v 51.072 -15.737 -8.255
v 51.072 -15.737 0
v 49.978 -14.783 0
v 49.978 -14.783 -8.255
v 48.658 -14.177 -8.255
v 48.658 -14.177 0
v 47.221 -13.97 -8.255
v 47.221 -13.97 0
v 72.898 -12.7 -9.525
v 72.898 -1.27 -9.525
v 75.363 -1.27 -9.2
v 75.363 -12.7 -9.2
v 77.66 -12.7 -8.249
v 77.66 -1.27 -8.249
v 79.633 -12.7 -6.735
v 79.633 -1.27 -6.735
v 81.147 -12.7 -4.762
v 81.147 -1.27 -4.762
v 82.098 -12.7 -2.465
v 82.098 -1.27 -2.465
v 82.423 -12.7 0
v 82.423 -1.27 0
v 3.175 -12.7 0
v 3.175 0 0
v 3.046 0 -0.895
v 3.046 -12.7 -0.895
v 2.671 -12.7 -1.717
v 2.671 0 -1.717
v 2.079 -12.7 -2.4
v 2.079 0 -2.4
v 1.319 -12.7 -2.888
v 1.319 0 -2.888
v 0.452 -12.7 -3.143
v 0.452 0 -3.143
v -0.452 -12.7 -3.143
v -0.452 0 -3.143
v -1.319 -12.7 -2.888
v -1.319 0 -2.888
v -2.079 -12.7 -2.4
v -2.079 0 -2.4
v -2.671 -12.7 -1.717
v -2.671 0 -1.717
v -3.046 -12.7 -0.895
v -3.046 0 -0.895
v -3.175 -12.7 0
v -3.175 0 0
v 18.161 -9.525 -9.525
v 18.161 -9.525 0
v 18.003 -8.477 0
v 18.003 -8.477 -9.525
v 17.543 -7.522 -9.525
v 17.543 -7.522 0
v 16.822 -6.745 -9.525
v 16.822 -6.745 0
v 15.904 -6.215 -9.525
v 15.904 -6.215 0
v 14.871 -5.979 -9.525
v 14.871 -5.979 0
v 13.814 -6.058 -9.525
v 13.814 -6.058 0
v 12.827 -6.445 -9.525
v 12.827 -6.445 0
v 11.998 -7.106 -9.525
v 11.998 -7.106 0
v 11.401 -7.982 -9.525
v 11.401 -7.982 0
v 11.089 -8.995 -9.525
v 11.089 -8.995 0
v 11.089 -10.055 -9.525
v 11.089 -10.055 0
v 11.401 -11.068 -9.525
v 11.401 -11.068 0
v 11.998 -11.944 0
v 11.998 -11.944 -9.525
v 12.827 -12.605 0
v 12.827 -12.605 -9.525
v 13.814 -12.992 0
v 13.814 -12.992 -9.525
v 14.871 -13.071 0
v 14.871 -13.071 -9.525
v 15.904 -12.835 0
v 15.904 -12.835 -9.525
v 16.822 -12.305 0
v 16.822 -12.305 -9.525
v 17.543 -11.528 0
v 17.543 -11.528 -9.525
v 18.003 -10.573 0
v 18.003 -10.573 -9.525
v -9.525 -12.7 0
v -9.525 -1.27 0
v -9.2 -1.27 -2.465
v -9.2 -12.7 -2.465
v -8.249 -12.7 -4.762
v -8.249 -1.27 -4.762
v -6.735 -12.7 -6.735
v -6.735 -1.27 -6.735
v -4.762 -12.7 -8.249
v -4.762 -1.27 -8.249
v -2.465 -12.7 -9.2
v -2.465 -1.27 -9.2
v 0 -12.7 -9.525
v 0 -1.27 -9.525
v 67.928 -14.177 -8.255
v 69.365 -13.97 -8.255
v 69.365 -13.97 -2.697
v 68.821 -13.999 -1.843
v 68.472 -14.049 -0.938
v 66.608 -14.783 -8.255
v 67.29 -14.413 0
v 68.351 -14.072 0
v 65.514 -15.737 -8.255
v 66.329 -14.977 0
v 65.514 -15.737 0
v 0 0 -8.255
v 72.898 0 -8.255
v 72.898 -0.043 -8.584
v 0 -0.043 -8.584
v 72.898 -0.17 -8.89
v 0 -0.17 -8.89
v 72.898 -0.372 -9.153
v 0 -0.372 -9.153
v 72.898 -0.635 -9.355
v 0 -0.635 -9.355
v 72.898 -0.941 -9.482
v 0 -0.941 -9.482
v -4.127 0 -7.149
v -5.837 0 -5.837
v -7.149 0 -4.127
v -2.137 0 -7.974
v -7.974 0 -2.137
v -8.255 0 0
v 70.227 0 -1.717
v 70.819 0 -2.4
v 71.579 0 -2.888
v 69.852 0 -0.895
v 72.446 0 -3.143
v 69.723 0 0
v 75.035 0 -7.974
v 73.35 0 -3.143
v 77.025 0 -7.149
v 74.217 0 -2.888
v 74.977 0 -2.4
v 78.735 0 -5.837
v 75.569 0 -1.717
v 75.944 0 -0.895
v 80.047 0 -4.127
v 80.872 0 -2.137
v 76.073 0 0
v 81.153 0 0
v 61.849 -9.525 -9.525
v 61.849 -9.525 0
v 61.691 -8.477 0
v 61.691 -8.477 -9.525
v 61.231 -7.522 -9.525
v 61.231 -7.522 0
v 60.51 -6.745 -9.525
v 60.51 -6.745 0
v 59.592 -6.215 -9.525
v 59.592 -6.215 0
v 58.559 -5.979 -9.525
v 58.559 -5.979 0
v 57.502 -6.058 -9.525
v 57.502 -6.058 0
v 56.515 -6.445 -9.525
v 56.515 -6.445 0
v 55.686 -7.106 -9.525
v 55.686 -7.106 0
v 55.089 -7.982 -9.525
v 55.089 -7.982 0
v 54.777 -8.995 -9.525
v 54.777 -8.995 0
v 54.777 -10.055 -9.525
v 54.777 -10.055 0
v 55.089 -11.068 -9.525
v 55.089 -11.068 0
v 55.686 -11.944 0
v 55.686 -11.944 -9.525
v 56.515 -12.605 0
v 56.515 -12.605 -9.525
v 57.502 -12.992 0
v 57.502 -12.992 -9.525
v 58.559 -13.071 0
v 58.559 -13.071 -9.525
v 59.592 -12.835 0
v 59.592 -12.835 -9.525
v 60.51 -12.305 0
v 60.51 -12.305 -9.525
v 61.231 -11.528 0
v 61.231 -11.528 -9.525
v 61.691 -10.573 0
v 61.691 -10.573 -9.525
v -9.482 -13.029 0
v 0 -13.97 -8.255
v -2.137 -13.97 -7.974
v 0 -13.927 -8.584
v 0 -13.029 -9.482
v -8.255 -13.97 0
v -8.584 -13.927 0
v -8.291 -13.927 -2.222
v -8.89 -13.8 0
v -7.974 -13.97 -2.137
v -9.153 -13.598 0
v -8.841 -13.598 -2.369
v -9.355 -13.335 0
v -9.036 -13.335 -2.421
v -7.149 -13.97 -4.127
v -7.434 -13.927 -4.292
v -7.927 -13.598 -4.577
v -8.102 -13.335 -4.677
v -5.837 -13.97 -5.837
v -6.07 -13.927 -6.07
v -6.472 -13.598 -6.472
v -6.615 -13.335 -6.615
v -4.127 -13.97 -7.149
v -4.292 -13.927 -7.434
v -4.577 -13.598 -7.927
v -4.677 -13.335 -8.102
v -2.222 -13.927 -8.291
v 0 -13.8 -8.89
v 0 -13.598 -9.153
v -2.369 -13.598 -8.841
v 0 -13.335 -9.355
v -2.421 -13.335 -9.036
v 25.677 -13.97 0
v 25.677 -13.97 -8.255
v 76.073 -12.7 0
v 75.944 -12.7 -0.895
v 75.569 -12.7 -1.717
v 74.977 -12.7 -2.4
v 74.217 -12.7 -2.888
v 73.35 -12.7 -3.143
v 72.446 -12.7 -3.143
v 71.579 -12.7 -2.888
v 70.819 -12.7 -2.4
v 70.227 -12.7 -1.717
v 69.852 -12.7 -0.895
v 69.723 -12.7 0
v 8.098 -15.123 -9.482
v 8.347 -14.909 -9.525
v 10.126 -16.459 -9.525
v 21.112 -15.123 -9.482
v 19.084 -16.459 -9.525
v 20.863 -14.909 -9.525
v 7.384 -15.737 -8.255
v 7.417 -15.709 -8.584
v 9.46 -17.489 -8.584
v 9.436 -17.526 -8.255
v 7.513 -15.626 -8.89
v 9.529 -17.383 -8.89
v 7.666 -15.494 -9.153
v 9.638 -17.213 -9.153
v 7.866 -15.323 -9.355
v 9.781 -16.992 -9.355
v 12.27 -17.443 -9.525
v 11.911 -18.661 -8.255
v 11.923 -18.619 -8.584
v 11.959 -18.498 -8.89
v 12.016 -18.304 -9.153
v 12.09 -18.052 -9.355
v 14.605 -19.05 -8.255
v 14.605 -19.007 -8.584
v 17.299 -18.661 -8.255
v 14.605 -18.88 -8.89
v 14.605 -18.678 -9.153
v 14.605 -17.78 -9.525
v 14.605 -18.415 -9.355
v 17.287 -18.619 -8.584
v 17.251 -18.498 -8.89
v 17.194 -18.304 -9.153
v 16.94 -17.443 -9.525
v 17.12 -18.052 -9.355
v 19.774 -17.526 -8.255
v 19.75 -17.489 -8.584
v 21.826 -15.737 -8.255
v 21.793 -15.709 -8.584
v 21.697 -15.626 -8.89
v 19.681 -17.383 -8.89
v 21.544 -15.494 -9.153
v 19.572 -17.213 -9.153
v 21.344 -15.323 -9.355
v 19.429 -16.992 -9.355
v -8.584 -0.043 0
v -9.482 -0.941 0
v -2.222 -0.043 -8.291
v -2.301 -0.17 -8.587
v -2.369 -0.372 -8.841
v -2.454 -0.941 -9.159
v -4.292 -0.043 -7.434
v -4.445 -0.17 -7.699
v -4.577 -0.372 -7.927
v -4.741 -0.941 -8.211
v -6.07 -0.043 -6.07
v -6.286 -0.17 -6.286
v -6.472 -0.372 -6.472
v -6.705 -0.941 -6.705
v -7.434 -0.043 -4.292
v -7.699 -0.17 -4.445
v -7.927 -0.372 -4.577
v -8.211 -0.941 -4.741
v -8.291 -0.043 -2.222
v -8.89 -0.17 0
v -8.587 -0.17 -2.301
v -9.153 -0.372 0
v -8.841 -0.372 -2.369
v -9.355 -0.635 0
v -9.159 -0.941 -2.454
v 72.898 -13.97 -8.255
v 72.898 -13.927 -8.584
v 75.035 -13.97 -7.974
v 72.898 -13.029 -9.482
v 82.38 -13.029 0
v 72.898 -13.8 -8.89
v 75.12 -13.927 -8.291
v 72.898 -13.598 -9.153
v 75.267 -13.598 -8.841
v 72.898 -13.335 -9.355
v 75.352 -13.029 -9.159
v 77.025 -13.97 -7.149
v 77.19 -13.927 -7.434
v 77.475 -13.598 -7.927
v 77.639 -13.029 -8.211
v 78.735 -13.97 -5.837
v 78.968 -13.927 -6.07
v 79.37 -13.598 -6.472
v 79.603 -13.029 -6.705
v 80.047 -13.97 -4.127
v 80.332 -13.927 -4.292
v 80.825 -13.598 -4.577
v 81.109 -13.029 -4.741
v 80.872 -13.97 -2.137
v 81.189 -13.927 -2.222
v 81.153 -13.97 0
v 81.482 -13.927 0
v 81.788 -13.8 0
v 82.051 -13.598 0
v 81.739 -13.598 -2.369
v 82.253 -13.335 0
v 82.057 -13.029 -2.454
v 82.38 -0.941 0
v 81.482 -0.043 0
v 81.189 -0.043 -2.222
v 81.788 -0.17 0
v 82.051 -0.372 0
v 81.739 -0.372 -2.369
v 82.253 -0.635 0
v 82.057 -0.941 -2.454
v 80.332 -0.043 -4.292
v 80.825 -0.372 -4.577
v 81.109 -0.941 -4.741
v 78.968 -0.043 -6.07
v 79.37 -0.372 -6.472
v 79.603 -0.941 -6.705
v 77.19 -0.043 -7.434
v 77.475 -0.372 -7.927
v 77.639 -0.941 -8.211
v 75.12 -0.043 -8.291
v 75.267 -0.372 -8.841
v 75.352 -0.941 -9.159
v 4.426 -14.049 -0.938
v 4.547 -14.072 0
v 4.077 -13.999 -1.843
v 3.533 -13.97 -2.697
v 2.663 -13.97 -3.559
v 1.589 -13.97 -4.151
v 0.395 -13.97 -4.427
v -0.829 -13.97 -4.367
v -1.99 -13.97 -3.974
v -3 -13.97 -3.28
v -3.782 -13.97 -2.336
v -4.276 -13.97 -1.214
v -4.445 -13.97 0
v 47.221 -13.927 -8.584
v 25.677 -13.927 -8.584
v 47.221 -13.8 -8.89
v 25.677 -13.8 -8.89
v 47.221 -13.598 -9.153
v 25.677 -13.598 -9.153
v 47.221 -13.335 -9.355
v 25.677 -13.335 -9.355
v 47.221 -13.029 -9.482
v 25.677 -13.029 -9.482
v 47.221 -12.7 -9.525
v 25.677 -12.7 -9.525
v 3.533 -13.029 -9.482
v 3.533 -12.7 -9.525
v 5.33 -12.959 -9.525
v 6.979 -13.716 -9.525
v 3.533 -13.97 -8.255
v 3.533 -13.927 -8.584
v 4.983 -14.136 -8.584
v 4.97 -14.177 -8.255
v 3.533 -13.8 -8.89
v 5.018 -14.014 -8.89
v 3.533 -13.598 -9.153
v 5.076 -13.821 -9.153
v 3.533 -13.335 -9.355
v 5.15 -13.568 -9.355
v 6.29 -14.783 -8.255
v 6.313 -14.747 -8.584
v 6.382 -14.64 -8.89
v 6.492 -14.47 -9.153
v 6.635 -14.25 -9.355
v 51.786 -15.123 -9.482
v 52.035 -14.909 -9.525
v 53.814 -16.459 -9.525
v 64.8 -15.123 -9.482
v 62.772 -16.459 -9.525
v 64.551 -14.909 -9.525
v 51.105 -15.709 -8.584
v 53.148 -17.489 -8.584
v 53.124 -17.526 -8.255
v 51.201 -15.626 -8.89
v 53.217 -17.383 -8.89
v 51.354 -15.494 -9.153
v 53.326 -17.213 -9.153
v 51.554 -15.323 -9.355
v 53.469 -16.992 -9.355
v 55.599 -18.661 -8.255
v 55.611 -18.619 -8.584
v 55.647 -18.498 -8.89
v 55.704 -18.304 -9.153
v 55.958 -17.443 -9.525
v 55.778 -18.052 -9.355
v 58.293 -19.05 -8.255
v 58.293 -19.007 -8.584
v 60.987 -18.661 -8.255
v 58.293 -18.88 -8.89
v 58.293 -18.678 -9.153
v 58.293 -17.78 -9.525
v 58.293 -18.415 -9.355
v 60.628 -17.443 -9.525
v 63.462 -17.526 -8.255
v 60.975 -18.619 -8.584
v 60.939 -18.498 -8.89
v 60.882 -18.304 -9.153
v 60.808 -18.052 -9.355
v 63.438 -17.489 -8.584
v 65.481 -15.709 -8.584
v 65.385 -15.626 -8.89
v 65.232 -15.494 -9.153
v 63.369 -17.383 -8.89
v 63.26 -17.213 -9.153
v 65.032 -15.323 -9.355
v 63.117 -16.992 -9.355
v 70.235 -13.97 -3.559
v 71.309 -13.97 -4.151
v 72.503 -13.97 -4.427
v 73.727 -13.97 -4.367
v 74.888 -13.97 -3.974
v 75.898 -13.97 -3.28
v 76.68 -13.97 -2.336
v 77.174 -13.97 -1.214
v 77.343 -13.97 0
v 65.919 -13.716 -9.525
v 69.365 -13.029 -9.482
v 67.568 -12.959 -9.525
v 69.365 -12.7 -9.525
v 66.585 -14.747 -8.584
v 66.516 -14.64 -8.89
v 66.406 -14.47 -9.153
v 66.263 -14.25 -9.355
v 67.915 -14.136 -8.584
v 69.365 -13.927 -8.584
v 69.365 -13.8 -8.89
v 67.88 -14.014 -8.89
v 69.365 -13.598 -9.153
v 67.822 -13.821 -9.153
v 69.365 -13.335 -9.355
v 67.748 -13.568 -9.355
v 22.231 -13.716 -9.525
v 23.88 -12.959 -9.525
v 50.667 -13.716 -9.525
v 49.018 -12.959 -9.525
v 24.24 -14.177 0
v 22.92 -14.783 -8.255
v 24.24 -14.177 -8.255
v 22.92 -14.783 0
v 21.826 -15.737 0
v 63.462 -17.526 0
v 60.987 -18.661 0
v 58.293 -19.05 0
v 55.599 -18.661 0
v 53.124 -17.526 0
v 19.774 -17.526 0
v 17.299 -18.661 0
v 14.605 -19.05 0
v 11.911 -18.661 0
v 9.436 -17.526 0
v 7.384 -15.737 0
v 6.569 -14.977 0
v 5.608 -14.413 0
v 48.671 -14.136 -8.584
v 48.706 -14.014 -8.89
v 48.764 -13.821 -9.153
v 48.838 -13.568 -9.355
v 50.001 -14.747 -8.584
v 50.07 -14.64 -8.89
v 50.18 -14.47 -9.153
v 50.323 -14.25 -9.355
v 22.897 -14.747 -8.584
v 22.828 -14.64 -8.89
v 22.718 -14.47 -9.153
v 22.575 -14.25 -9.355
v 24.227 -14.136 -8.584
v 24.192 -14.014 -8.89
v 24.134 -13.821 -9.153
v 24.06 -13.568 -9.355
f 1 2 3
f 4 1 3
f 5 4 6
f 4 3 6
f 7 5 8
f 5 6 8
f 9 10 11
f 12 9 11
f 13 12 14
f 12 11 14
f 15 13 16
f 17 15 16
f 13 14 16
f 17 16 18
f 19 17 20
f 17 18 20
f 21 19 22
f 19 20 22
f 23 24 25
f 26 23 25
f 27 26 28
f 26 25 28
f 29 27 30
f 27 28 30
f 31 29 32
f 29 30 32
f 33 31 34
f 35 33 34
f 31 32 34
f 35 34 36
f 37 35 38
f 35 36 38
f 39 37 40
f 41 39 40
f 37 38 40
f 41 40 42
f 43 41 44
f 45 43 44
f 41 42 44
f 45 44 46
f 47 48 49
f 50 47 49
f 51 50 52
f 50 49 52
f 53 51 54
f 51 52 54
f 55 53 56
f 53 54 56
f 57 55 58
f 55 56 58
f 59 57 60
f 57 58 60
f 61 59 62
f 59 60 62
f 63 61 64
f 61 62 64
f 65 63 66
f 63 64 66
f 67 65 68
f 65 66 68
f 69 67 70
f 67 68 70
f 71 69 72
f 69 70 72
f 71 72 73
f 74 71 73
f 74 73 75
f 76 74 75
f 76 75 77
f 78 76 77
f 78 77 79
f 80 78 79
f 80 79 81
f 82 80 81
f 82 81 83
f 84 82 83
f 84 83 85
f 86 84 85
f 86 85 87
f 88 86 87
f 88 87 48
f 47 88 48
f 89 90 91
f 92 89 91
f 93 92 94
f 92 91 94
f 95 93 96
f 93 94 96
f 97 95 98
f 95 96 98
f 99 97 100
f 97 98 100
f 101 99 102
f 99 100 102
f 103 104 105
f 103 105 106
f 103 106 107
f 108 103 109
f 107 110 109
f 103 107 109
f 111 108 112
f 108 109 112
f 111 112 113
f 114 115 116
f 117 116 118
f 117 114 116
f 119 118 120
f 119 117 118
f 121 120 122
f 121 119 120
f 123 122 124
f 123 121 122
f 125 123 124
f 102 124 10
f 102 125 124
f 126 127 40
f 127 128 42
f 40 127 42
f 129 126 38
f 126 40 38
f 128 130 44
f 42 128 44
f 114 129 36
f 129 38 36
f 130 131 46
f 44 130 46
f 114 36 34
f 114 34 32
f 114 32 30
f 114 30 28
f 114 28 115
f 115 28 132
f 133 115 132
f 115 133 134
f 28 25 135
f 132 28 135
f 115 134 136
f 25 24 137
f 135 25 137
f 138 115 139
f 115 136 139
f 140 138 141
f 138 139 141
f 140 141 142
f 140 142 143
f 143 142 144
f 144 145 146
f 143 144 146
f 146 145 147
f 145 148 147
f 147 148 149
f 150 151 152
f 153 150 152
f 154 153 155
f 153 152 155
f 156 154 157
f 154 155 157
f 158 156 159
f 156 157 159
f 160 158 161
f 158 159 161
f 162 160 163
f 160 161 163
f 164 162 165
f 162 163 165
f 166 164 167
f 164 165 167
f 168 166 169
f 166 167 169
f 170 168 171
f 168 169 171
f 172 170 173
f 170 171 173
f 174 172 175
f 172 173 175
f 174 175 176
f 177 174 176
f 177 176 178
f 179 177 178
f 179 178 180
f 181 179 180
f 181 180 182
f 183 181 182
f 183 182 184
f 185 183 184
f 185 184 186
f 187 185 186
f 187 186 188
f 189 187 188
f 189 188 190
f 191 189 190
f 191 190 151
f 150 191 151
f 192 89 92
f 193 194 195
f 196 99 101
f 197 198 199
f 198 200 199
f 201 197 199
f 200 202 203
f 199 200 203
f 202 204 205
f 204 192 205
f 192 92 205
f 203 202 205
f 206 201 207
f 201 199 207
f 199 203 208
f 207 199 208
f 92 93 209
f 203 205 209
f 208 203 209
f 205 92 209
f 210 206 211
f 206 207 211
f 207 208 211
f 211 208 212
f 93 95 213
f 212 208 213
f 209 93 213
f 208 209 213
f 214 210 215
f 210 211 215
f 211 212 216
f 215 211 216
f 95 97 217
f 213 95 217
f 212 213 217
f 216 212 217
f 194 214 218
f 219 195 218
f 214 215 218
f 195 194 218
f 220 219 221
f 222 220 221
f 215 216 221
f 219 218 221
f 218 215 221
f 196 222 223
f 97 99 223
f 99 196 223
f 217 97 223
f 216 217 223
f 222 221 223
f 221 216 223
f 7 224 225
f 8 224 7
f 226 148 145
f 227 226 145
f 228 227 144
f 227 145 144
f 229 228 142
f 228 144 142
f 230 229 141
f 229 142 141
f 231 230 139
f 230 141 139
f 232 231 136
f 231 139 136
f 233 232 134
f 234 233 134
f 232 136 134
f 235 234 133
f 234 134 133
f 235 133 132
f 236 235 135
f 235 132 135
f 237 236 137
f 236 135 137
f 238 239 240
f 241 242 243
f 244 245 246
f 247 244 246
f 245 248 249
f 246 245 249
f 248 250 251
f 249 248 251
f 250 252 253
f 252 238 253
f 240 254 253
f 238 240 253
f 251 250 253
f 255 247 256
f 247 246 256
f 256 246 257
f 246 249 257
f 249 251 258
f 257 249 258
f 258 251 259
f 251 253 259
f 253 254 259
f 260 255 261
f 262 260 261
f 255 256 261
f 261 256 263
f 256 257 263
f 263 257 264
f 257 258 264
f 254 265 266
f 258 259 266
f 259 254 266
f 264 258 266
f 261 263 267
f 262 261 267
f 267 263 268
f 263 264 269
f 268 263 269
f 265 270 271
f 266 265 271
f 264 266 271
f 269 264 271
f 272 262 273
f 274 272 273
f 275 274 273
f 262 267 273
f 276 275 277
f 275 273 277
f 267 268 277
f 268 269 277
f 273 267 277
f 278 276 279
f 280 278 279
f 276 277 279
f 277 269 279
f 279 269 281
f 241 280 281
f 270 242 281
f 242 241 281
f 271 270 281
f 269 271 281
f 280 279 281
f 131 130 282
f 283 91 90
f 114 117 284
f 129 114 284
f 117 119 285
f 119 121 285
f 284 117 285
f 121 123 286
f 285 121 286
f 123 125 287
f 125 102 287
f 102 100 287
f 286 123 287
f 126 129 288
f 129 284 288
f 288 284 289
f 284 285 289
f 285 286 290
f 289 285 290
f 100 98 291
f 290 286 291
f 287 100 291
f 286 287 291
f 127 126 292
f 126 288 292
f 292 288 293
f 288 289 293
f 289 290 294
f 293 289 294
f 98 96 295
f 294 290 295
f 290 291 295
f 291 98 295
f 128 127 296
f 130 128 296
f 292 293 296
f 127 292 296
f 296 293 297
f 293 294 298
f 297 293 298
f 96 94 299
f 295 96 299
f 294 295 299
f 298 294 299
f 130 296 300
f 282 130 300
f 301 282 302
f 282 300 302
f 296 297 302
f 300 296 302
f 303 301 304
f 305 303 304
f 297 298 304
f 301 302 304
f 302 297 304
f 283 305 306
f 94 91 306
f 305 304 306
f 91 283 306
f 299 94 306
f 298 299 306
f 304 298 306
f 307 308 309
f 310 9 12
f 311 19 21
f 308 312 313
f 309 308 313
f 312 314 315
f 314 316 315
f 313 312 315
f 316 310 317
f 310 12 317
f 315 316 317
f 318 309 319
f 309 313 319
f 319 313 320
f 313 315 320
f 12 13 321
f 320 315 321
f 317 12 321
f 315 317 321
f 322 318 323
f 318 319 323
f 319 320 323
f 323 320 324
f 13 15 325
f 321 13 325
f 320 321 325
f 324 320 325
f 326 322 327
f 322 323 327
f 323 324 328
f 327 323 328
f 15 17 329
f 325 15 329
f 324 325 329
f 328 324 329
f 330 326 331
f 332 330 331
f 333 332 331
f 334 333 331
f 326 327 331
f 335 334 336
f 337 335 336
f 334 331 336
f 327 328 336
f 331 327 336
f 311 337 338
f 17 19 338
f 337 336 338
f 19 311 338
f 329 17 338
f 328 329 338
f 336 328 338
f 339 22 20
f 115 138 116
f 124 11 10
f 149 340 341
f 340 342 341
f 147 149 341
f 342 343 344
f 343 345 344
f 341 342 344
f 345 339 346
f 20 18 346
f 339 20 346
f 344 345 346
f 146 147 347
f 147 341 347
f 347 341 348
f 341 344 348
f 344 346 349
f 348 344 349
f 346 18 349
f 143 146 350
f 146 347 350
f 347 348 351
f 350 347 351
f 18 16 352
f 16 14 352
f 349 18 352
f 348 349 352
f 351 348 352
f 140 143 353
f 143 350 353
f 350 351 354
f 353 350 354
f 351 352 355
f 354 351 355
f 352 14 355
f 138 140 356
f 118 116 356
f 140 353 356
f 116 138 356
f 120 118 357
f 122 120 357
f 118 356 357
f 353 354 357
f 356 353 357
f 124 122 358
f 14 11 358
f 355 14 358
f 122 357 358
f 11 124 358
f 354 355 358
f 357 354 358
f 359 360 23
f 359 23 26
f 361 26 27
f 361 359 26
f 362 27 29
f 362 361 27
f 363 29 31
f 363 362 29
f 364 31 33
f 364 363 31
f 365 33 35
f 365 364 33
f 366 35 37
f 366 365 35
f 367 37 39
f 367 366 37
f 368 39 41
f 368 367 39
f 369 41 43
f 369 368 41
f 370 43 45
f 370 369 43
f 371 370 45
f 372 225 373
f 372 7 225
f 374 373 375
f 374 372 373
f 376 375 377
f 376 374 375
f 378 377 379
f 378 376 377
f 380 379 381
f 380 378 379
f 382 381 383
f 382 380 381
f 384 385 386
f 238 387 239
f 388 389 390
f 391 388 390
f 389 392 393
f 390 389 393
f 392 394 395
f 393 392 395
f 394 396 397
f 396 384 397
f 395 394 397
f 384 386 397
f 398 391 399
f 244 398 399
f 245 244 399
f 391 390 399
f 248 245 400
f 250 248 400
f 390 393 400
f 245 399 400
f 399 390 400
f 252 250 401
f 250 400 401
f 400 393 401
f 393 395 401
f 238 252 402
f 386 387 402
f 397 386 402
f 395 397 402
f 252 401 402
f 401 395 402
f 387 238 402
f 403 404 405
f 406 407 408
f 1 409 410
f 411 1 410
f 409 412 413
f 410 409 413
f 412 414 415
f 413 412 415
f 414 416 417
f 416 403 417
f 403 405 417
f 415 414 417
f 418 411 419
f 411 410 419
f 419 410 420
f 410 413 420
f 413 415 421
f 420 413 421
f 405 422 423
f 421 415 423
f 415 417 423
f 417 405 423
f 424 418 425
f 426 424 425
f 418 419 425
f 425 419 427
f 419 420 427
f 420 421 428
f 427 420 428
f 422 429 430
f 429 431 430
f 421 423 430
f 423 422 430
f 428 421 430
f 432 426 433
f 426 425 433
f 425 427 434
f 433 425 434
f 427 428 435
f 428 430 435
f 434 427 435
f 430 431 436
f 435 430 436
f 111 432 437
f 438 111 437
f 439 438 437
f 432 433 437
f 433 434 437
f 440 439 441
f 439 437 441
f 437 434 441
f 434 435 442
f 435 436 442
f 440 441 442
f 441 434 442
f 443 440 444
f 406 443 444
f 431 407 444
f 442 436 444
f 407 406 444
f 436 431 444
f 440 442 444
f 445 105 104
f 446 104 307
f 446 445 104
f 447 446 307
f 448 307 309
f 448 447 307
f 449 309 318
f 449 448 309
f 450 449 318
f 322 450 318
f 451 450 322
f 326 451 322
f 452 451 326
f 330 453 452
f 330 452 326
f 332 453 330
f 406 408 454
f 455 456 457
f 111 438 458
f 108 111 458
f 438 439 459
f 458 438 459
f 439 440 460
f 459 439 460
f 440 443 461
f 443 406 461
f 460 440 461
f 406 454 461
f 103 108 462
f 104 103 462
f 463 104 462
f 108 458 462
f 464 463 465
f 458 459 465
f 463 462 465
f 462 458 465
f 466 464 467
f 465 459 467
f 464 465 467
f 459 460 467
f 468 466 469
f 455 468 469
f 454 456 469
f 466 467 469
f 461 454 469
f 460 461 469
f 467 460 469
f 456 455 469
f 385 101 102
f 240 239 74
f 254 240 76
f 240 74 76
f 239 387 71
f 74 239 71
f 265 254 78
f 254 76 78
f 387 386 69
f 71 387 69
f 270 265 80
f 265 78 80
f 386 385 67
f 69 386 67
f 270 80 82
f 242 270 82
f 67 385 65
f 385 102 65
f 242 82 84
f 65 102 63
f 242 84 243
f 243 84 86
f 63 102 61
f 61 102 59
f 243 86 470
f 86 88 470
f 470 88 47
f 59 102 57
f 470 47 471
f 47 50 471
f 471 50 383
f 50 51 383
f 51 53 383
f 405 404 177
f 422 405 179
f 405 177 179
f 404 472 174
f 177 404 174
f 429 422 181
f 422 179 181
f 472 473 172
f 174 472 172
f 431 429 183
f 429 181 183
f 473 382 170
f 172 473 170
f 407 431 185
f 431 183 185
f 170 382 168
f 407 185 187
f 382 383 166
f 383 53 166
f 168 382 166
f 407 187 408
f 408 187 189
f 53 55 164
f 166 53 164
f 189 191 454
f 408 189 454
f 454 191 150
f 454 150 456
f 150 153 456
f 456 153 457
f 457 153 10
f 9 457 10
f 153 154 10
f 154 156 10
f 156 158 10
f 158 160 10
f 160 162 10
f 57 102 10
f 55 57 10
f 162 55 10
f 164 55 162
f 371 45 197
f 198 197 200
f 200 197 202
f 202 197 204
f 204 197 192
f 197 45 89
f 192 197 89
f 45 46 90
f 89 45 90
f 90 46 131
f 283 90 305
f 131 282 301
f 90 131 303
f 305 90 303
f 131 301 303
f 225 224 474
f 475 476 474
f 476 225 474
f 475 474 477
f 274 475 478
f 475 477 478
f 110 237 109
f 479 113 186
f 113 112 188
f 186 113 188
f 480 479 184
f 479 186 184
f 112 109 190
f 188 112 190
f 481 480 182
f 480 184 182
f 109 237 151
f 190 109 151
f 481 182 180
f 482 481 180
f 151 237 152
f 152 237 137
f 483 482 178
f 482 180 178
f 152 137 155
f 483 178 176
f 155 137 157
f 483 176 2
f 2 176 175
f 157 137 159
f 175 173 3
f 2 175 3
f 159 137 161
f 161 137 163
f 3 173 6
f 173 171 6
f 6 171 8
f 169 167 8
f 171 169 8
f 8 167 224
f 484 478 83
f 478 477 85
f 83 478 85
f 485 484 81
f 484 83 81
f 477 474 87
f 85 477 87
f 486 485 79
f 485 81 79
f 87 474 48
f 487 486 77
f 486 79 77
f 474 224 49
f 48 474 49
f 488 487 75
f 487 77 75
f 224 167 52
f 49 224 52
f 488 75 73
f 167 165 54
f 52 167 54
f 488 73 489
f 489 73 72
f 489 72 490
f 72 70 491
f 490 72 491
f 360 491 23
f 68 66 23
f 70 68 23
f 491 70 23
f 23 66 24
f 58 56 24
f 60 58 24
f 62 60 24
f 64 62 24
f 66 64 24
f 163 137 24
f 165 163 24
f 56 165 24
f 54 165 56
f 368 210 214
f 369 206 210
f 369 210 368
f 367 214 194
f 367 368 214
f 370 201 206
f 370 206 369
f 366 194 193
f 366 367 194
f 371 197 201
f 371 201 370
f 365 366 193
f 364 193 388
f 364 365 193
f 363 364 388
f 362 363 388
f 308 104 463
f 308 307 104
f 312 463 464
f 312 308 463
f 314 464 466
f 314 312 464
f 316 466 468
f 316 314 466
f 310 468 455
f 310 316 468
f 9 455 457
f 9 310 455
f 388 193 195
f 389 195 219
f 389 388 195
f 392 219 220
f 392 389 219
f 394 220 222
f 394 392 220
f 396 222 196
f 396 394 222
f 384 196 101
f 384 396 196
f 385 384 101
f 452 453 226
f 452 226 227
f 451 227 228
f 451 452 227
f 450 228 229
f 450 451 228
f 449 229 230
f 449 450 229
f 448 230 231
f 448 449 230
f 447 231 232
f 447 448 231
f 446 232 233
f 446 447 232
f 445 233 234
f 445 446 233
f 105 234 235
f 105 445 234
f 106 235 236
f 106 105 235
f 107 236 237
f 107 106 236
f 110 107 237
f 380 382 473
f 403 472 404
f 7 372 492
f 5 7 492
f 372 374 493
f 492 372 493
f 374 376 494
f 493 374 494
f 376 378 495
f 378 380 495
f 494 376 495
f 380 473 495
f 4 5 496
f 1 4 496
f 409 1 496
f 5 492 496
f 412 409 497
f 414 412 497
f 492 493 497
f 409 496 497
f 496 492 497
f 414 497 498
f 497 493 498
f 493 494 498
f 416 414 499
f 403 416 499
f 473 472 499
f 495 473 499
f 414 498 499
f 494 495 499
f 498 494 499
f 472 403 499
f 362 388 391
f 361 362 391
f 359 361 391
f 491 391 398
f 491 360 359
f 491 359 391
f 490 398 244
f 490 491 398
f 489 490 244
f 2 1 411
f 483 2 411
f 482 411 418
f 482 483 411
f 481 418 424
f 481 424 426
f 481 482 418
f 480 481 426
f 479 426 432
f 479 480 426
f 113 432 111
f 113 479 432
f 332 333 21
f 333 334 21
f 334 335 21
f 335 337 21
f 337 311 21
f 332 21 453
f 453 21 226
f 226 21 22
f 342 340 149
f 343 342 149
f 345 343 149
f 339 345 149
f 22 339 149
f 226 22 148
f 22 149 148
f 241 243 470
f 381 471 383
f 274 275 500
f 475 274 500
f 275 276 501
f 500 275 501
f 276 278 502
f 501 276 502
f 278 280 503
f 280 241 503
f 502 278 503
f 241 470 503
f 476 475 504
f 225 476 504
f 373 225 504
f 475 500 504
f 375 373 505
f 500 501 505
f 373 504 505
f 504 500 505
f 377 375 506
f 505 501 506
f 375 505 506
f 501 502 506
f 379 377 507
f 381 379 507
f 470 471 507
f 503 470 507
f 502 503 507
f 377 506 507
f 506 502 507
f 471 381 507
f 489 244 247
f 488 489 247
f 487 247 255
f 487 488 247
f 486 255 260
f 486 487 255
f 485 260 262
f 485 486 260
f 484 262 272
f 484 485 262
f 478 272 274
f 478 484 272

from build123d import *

# Parameters (mm, degrees)
F1_DEPTH = 13.97
F2_R     = 9.525
F3_DEPTH = 9.525
F4_R     = 3.556
F5_DEPTH = 9.526
F6_SIZE  = 1.27
F7_R     = 5.08
F8_R     = 1.27


with BuildPart() as f1:
    # F0 (on Front) → F1 (new body)
    with BuildSketch(Plane.XZ):
        with BuildLine():
            ThreePointArc((3.175, 0), (0, -3.175), (-3.175, 0))
            Line((-3.175, 0), (-9.525, 0))
            ThreePointArc((-9.525, 0), (-6.7351920908, -6.7351920908), (0, -9.525))
            ThreePointArc((0, -9.525), (6.7351920908, -6.7351920908), (9.525, 0))
            Line((9.525, 0), (3.175, 0))
        make_face()
        with BuildLine():
            Line((63.373, 0), (9.525, 0))
            ThreePointArc((9.525, 0), (6.7351920908, -6.7351920908), (0, -9.525))
            Line((0, -9.525), (72.898, -9.525))
            ThreePointArc((72.898, -9.525), (66.1628079092, -6.7351920908), (63.373, 0))
        make_face()
        with BuildLine():
            Line((69.723, 0), (63.373, 0))
            ThreePointArc((63.373, 0), (66.1628079092, -6.7351920908), (72.898, -9.525))
            ThreePointArc((72.898, -9.525), (79.6331920908, -6.7351920908), (82.423, 0))
            Line((82.423, 0), (76.073, 0))
            ThreePointArc((76.073, 0), (72.898, -3.175), (69.723, 0))
        make_face()
    extrude(amount=F1_DEPTH)

    # F2 (on face) → F3 (join, through all)
    with BuildSketch(Plane.XY):
        with Locations((14.605, -9.525)):
            Circle(F2_R)
        with Locations((58.293, -9.525)):
            Circle(F2_R)
    extrude(amount=-F3_DEPTH)

    # F4 (on face) → F5 (cut, through all)
    with BuildSketch(Plane.XY):
        with Locations((14.605, -9.525)):
            Circle(F4_R)
        with Locations((58.293, -9.525)):
            Circle(F4_R)
    extrude(amount=-F5_DEPTH, mode=Mode.SUBTRACT)

    # F6
    f6_edges = [f1.edges().sort_by_distance(p)[0] for p in [
        (0, -13.97, -3.175),
        (72.898, -13.97, -3.175),
    ]]
    chamfer(f6_edges, length=F6_SIZE)

    # F7
    f7_edges = [f1.edges().sort_by_distance(p)[0] for p in [
        (6.180773, -13.97, -4.7625),
        (23.029227, -13.97, -4.7625),
        (66.717227, -13.97, -4.7625),
        (49.868773, -13.97, -4.7625),
    ]]
    fillet(f7_edges, radius=F7_R)

    # F8
    f8_edges = [f1.edges().sort_by_distance(p)[0] for p in [
        (36.449, -13.97, -9.525),
        (36.449, 0, -9.525),
    ]]
    fillet(f8_edges, radius=F8_R)


solid = f1.part
